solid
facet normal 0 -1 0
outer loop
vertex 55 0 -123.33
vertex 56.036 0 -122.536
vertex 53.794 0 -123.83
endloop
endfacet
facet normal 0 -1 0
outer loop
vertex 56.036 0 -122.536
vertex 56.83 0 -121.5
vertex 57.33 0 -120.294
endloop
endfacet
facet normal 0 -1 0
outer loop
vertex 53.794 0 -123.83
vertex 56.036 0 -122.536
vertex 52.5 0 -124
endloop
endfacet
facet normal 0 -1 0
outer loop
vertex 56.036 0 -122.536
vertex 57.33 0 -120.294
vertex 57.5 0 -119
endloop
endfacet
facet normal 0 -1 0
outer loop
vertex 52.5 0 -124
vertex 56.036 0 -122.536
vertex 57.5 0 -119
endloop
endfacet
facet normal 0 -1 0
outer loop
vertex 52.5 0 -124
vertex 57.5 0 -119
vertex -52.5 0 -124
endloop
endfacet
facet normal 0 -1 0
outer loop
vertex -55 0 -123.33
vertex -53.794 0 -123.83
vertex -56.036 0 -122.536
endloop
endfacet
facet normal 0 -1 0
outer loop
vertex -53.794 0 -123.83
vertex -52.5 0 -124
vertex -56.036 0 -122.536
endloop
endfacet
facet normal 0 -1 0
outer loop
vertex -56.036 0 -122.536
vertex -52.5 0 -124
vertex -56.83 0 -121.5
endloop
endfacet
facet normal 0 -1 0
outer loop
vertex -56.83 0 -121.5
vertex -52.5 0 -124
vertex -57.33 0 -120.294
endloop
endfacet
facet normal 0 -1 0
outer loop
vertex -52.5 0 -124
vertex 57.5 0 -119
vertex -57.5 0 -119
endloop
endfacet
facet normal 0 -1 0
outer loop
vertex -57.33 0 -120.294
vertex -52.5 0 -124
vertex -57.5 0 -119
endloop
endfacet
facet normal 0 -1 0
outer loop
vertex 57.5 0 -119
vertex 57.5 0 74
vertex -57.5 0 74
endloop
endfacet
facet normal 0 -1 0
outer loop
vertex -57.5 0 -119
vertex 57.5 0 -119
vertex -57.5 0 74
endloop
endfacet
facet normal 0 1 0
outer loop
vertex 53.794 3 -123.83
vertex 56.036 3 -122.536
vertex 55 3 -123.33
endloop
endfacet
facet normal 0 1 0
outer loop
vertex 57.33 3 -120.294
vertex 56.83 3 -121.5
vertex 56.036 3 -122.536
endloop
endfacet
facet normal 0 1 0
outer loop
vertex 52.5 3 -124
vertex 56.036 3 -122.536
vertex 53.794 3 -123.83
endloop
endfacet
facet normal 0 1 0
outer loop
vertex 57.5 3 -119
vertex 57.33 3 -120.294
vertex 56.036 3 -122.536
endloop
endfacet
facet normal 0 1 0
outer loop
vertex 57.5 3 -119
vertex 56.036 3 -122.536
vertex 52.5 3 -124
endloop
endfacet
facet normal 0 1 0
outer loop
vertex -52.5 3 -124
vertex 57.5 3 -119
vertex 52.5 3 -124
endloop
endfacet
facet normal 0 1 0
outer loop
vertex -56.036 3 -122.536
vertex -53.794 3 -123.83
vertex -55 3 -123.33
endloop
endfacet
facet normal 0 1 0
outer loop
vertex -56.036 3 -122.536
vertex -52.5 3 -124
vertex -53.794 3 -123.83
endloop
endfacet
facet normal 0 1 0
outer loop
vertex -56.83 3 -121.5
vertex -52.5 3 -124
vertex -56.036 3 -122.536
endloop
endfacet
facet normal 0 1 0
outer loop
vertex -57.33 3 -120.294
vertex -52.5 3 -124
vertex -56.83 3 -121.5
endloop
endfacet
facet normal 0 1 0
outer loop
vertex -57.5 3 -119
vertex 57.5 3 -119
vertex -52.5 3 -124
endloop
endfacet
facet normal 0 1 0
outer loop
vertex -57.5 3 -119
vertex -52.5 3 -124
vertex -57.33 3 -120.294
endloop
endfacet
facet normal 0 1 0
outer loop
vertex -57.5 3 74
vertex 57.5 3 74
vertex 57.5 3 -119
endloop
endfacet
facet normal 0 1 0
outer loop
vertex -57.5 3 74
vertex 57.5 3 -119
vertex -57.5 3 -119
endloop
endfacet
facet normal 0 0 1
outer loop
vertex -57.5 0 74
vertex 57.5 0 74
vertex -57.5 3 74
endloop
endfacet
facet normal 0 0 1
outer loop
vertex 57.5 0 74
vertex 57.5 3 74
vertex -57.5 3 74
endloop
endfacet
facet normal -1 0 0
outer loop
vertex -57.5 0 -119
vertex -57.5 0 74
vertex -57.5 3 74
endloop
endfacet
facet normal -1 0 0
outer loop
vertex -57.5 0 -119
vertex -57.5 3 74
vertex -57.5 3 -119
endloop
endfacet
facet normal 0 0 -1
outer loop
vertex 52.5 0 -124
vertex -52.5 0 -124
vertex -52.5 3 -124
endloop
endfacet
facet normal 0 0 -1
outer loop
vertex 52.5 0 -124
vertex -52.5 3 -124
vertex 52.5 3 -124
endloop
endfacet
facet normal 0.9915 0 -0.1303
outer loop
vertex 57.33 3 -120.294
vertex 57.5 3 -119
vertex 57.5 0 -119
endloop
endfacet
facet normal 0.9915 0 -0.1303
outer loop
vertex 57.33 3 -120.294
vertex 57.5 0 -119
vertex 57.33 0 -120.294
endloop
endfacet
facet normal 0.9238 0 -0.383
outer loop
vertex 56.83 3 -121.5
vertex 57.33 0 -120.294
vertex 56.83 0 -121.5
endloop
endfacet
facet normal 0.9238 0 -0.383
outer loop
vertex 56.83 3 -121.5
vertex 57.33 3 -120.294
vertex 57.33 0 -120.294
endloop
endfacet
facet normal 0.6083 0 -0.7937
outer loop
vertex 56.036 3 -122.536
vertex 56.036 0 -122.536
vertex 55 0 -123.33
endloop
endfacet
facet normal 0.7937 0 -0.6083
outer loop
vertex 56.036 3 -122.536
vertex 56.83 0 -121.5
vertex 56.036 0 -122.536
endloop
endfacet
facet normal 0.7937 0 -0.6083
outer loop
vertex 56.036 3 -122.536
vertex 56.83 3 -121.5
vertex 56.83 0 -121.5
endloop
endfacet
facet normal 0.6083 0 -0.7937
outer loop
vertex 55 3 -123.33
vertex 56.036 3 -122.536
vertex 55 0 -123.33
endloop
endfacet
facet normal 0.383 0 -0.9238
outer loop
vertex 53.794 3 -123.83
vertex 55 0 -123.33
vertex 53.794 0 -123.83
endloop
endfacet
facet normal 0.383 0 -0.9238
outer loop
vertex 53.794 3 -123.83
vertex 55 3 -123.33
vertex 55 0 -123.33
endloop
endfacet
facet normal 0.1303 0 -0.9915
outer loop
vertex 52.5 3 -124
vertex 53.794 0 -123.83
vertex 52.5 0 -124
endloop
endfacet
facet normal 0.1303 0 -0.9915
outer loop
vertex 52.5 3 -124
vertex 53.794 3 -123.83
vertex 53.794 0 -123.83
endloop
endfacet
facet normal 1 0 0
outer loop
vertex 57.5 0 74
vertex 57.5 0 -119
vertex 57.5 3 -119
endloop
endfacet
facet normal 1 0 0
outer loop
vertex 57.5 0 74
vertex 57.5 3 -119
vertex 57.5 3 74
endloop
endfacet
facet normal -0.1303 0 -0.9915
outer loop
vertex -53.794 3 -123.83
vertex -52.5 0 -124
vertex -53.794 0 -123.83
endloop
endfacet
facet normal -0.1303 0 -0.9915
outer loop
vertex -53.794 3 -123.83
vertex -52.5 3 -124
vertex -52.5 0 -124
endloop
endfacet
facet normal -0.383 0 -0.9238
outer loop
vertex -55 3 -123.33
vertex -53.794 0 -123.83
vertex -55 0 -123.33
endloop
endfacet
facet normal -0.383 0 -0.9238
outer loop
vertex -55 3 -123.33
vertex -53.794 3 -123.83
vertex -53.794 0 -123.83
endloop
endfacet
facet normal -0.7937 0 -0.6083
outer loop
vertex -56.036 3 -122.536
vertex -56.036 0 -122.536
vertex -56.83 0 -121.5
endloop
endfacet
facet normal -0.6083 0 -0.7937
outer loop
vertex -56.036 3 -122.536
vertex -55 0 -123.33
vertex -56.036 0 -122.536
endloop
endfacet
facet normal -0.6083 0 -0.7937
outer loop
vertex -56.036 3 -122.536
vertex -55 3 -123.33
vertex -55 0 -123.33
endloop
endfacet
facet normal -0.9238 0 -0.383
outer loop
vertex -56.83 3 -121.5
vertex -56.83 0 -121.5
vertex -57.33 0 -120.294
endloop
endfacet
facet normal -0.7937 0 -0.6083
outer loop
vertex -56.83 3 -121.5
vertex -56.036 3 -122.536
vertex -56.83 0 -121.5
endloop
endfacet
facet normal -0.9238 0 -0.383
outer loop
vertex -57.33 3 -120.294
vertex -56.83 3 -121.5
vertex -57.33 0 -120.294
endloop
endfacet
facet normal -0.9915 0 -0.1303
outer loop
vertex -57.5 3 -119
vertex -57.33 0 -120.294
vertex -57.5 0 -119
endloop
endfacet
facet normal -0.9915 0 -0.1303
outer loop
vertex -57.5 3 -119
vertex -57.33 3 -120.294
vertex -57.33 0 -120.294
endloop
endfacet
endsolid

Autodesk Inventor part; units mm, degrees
ref_plane "YZ Plane" through (0, 0, 0) normal (1, 0, 0) x (0, 1, 0)
ref_plane "XZ Plane" through (0, 0, 0) normal (0, 1, 0) x (-1, 0, 0)
ref_plane "XY Plane" through (0, 0, 0) normal (0, 0, 1) x (1, 0, 0)
sketch "Sketch1" plane through (0, 0, 0) normal (0, 1, 0) x (-1, 0, 0)
  line L0 (-57.5, 124) -> (57.5, 124)
  line L1 (57.5, 124) -> (57.5, -124)
  line L2 (57.5, -124) -> (-57.5, -124)
  line L3 (-57.5, -124) -> (-57.5, 124)
  line L4 (-57.5, 124) -> (57.5, -124) construction
  line L5 (57.5, 124) -> (-57.5, -124) construction
  point P0 (0, 0)
  dimension "d0" = 248
  dimension "d1" = 115
extrude "Extrusion1" add sketch "Sketch1" along normal blind 3
fillet "Fillet1" radius 5 4 edges at (57.5, 1.5, 124) (57.5, 1.5, -124) (-57.5, 1.5, 124) (-57.5, 1.5, -124)
sketch "Sketch2" plane through (0, 3, 0) normal (0, 1, 0) x (1, 0, 0)
  line L0 (-57.5, -124) -> (57.5, -124)
  line L1 (57.5, -124) -> (57.5, -74)
  line L2 (57.5, -74) -> (-57.5, -74)
  line L3 (-57.5, -74) -> (-57.5, -124)
  line L4 (-52.5, -124) -> (52.5, -124) projected
  line L5 (57.5, -119) -> (57.5, 119) projected
  line L6 (-57.5, 119) -> (-57.5, -119) projected
  point P0 (0, 0)
  dimension "d5" = 50
extrude "Extrusion2" cut sketch "Sketch2" against normal blind 3
properties part number "PMMA_lid_long"
